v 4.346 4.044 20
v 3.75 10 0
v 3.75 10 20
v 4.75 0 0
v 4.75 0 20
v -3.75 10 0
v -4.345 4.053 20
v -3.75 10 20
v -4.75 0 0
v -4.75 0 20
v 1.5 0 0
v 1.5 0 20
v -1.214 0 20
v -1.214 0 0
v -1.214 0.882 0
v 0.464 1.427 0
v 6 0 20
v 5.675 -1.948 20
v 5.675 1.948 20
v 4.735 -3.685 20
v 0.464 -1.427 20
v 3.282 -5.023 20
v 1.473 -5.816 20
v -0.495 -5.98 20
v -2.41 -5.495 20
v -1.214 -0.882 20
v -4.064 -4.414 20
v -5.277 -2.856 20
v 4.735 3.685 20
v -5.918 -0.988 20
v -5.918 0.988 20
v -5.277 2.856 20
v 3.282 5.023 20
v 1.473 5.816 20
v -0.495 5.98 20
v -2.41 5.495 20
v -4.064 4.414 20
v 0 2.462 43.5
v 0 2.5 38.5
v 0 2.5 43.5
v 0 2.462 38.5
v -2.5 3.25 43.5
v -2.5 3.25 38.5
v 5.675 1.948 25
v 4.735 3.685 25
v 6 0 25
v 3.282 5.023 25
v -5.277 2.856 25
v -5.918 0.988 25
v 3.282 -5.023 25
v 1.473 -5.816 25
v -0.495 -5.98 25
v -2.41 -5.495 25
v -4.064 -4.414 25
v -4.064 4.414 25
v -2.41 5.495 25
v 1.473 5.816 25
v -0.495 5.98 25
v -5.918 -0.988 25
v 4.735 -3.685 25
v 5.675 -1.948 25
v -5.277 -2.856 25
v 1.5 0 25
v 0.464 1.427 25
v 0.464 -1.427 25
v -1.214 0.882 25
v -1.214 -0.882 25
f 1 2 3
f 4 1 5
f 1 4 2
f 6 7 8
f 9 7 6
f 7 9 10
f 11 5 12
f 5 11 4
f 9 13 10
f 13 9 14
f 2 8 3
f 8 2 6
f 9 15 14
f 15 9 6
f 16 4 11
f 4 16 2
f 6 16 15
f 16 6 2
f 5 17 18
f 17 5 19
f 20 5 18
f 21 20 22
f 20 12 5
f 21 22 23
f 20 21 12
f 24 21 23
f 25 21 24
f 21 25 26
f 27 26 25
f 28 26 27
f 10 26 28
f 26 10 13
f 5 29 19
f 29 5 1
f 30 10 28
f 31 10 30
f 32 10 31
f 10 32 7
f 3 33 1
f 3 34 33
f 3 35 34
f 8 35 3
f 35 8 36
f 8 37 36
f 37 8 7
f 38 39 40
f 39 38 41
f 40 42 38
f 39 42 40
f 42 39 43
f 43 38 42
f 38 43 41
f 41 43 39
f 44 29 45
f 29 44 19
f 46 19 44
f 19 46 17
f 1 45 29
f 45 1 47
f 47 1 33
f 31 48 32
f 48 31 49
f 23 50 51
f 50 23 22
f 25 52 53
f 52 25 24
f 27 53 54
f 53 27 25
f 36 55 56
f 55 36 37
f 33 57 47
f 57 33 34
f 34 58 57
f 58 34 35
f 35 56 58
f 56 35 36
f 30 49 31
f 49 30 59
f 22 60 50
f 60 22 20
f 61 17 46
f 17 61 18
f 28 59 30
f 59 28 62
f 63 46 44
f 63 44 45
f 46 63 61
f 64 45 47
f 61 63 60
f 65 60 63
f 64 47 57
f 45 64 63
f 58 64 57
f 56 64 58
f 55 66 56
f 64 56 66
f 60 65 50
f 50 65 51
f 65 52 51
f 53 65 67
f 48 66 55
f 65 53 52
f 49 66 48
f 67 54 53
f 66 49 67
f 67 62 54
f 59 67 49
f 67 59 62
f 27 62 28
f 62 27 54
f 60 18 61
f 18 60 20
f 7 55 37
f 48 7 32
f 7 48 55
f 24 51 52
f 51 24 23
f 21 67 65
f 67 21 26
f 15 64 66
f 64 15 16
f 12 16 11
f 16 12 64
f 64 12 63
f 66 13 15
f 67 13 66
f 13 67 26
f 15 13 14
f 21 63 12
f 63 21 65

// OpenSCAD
// Straight hose-barb reducer: 8 mm tubing (barbs) -> 5 mm tubing (barbs)
// Print orientation: standing upright along Z, centred on origin in X/Y

// ---------------- Parameters ----------------
bore      = 3;    // through-bore diameter (mm)
eps       = 0.5;  // cutter overshoot past faces (mm)

// Lower section (z = 0 .. 20): 8 mm tubing barbs
z_barb_a  = 20;   // height of lower barbs (mm)
d_barb_a  = 8;    // tubing inner diameter (mm)
d_barb_o  = 9.5;  // outer diameter at top of barb (mm)
d_barb_b  = 7.5;  // outer diameter at bottom of barb / after step (mm)

// Collar (z = 20 .. 25)
z_collar  = 5;    // collar height (mm)
d_collar  = 12;   // collar outer diameter (mm)

// Upper section (z = 25 .. 41): 5 mm tubing barbs
z_barb_c  = 41;   // top of upper barbs (mm)
d_barb_d  = 5;    // tubing inner diameter (mm)
d_barb_e  = 6.5;  // outer diameter at bottom of barb / after step (mm)
d_barb_f  = 5.0;  // outer diameter at top of barb (mm)

n_barbs   = 2;    // number of barbs, stacked

// ---------------- Derived ----------------
total_h = z_barb_c;
// Cone angle of a barb (used for the shrinking upper barbs)
d_barb_ca = d_barb_f - d_barb_e;
d_barb_c  = d_barb_e + d_barb_ca * (z_barb_c - z_barb_a) / z_barb_a;

// ---------------- Model ----------------
difference() {
    union() {
        // Lower barbs: sawtooth profile, stacked
        for (i = [0 : n_barbs - 1])
            translate([0, 0, i * z_barb_a / n_barbs])
                linear_extrude(height = z_barb_a / n_barbs)
                    polygon(points = [
                        [-d_barb_o / 2, 0],
                        [ d_barb_o / 2, 0],
                        [ d_barb_b / 2, z_barb_a / n_barbs],
                        [-d_barb_b / 2, z_barb_a / n_barbs]
                    ]);

        // Collar
        translate([0, 0, z_barb_a])
            cylinder(h = z_collar, d = d_collar);

        // Upper barbs: cone profile, stacked
        for (i = [0 : n_barbs - 1])
            translate([0, 0, z_barb_c - i * z_collar / n_barbs])
                rotate([0, 0, 90])
                    linear_extrude(height = z_collar / n_barbs)
                        polygon(points = [
                            [d_barb_c / 2, 0],
                            [d_barb_e / 2, z_collar / n_barbs],
                            [d_barb_f / 2, 0]
                        ]);
    }

    // Full-length through-bore
    translate([0, 0, -eps])
        cylinder(h = total_h + 2 * eps, d = bore);
}
